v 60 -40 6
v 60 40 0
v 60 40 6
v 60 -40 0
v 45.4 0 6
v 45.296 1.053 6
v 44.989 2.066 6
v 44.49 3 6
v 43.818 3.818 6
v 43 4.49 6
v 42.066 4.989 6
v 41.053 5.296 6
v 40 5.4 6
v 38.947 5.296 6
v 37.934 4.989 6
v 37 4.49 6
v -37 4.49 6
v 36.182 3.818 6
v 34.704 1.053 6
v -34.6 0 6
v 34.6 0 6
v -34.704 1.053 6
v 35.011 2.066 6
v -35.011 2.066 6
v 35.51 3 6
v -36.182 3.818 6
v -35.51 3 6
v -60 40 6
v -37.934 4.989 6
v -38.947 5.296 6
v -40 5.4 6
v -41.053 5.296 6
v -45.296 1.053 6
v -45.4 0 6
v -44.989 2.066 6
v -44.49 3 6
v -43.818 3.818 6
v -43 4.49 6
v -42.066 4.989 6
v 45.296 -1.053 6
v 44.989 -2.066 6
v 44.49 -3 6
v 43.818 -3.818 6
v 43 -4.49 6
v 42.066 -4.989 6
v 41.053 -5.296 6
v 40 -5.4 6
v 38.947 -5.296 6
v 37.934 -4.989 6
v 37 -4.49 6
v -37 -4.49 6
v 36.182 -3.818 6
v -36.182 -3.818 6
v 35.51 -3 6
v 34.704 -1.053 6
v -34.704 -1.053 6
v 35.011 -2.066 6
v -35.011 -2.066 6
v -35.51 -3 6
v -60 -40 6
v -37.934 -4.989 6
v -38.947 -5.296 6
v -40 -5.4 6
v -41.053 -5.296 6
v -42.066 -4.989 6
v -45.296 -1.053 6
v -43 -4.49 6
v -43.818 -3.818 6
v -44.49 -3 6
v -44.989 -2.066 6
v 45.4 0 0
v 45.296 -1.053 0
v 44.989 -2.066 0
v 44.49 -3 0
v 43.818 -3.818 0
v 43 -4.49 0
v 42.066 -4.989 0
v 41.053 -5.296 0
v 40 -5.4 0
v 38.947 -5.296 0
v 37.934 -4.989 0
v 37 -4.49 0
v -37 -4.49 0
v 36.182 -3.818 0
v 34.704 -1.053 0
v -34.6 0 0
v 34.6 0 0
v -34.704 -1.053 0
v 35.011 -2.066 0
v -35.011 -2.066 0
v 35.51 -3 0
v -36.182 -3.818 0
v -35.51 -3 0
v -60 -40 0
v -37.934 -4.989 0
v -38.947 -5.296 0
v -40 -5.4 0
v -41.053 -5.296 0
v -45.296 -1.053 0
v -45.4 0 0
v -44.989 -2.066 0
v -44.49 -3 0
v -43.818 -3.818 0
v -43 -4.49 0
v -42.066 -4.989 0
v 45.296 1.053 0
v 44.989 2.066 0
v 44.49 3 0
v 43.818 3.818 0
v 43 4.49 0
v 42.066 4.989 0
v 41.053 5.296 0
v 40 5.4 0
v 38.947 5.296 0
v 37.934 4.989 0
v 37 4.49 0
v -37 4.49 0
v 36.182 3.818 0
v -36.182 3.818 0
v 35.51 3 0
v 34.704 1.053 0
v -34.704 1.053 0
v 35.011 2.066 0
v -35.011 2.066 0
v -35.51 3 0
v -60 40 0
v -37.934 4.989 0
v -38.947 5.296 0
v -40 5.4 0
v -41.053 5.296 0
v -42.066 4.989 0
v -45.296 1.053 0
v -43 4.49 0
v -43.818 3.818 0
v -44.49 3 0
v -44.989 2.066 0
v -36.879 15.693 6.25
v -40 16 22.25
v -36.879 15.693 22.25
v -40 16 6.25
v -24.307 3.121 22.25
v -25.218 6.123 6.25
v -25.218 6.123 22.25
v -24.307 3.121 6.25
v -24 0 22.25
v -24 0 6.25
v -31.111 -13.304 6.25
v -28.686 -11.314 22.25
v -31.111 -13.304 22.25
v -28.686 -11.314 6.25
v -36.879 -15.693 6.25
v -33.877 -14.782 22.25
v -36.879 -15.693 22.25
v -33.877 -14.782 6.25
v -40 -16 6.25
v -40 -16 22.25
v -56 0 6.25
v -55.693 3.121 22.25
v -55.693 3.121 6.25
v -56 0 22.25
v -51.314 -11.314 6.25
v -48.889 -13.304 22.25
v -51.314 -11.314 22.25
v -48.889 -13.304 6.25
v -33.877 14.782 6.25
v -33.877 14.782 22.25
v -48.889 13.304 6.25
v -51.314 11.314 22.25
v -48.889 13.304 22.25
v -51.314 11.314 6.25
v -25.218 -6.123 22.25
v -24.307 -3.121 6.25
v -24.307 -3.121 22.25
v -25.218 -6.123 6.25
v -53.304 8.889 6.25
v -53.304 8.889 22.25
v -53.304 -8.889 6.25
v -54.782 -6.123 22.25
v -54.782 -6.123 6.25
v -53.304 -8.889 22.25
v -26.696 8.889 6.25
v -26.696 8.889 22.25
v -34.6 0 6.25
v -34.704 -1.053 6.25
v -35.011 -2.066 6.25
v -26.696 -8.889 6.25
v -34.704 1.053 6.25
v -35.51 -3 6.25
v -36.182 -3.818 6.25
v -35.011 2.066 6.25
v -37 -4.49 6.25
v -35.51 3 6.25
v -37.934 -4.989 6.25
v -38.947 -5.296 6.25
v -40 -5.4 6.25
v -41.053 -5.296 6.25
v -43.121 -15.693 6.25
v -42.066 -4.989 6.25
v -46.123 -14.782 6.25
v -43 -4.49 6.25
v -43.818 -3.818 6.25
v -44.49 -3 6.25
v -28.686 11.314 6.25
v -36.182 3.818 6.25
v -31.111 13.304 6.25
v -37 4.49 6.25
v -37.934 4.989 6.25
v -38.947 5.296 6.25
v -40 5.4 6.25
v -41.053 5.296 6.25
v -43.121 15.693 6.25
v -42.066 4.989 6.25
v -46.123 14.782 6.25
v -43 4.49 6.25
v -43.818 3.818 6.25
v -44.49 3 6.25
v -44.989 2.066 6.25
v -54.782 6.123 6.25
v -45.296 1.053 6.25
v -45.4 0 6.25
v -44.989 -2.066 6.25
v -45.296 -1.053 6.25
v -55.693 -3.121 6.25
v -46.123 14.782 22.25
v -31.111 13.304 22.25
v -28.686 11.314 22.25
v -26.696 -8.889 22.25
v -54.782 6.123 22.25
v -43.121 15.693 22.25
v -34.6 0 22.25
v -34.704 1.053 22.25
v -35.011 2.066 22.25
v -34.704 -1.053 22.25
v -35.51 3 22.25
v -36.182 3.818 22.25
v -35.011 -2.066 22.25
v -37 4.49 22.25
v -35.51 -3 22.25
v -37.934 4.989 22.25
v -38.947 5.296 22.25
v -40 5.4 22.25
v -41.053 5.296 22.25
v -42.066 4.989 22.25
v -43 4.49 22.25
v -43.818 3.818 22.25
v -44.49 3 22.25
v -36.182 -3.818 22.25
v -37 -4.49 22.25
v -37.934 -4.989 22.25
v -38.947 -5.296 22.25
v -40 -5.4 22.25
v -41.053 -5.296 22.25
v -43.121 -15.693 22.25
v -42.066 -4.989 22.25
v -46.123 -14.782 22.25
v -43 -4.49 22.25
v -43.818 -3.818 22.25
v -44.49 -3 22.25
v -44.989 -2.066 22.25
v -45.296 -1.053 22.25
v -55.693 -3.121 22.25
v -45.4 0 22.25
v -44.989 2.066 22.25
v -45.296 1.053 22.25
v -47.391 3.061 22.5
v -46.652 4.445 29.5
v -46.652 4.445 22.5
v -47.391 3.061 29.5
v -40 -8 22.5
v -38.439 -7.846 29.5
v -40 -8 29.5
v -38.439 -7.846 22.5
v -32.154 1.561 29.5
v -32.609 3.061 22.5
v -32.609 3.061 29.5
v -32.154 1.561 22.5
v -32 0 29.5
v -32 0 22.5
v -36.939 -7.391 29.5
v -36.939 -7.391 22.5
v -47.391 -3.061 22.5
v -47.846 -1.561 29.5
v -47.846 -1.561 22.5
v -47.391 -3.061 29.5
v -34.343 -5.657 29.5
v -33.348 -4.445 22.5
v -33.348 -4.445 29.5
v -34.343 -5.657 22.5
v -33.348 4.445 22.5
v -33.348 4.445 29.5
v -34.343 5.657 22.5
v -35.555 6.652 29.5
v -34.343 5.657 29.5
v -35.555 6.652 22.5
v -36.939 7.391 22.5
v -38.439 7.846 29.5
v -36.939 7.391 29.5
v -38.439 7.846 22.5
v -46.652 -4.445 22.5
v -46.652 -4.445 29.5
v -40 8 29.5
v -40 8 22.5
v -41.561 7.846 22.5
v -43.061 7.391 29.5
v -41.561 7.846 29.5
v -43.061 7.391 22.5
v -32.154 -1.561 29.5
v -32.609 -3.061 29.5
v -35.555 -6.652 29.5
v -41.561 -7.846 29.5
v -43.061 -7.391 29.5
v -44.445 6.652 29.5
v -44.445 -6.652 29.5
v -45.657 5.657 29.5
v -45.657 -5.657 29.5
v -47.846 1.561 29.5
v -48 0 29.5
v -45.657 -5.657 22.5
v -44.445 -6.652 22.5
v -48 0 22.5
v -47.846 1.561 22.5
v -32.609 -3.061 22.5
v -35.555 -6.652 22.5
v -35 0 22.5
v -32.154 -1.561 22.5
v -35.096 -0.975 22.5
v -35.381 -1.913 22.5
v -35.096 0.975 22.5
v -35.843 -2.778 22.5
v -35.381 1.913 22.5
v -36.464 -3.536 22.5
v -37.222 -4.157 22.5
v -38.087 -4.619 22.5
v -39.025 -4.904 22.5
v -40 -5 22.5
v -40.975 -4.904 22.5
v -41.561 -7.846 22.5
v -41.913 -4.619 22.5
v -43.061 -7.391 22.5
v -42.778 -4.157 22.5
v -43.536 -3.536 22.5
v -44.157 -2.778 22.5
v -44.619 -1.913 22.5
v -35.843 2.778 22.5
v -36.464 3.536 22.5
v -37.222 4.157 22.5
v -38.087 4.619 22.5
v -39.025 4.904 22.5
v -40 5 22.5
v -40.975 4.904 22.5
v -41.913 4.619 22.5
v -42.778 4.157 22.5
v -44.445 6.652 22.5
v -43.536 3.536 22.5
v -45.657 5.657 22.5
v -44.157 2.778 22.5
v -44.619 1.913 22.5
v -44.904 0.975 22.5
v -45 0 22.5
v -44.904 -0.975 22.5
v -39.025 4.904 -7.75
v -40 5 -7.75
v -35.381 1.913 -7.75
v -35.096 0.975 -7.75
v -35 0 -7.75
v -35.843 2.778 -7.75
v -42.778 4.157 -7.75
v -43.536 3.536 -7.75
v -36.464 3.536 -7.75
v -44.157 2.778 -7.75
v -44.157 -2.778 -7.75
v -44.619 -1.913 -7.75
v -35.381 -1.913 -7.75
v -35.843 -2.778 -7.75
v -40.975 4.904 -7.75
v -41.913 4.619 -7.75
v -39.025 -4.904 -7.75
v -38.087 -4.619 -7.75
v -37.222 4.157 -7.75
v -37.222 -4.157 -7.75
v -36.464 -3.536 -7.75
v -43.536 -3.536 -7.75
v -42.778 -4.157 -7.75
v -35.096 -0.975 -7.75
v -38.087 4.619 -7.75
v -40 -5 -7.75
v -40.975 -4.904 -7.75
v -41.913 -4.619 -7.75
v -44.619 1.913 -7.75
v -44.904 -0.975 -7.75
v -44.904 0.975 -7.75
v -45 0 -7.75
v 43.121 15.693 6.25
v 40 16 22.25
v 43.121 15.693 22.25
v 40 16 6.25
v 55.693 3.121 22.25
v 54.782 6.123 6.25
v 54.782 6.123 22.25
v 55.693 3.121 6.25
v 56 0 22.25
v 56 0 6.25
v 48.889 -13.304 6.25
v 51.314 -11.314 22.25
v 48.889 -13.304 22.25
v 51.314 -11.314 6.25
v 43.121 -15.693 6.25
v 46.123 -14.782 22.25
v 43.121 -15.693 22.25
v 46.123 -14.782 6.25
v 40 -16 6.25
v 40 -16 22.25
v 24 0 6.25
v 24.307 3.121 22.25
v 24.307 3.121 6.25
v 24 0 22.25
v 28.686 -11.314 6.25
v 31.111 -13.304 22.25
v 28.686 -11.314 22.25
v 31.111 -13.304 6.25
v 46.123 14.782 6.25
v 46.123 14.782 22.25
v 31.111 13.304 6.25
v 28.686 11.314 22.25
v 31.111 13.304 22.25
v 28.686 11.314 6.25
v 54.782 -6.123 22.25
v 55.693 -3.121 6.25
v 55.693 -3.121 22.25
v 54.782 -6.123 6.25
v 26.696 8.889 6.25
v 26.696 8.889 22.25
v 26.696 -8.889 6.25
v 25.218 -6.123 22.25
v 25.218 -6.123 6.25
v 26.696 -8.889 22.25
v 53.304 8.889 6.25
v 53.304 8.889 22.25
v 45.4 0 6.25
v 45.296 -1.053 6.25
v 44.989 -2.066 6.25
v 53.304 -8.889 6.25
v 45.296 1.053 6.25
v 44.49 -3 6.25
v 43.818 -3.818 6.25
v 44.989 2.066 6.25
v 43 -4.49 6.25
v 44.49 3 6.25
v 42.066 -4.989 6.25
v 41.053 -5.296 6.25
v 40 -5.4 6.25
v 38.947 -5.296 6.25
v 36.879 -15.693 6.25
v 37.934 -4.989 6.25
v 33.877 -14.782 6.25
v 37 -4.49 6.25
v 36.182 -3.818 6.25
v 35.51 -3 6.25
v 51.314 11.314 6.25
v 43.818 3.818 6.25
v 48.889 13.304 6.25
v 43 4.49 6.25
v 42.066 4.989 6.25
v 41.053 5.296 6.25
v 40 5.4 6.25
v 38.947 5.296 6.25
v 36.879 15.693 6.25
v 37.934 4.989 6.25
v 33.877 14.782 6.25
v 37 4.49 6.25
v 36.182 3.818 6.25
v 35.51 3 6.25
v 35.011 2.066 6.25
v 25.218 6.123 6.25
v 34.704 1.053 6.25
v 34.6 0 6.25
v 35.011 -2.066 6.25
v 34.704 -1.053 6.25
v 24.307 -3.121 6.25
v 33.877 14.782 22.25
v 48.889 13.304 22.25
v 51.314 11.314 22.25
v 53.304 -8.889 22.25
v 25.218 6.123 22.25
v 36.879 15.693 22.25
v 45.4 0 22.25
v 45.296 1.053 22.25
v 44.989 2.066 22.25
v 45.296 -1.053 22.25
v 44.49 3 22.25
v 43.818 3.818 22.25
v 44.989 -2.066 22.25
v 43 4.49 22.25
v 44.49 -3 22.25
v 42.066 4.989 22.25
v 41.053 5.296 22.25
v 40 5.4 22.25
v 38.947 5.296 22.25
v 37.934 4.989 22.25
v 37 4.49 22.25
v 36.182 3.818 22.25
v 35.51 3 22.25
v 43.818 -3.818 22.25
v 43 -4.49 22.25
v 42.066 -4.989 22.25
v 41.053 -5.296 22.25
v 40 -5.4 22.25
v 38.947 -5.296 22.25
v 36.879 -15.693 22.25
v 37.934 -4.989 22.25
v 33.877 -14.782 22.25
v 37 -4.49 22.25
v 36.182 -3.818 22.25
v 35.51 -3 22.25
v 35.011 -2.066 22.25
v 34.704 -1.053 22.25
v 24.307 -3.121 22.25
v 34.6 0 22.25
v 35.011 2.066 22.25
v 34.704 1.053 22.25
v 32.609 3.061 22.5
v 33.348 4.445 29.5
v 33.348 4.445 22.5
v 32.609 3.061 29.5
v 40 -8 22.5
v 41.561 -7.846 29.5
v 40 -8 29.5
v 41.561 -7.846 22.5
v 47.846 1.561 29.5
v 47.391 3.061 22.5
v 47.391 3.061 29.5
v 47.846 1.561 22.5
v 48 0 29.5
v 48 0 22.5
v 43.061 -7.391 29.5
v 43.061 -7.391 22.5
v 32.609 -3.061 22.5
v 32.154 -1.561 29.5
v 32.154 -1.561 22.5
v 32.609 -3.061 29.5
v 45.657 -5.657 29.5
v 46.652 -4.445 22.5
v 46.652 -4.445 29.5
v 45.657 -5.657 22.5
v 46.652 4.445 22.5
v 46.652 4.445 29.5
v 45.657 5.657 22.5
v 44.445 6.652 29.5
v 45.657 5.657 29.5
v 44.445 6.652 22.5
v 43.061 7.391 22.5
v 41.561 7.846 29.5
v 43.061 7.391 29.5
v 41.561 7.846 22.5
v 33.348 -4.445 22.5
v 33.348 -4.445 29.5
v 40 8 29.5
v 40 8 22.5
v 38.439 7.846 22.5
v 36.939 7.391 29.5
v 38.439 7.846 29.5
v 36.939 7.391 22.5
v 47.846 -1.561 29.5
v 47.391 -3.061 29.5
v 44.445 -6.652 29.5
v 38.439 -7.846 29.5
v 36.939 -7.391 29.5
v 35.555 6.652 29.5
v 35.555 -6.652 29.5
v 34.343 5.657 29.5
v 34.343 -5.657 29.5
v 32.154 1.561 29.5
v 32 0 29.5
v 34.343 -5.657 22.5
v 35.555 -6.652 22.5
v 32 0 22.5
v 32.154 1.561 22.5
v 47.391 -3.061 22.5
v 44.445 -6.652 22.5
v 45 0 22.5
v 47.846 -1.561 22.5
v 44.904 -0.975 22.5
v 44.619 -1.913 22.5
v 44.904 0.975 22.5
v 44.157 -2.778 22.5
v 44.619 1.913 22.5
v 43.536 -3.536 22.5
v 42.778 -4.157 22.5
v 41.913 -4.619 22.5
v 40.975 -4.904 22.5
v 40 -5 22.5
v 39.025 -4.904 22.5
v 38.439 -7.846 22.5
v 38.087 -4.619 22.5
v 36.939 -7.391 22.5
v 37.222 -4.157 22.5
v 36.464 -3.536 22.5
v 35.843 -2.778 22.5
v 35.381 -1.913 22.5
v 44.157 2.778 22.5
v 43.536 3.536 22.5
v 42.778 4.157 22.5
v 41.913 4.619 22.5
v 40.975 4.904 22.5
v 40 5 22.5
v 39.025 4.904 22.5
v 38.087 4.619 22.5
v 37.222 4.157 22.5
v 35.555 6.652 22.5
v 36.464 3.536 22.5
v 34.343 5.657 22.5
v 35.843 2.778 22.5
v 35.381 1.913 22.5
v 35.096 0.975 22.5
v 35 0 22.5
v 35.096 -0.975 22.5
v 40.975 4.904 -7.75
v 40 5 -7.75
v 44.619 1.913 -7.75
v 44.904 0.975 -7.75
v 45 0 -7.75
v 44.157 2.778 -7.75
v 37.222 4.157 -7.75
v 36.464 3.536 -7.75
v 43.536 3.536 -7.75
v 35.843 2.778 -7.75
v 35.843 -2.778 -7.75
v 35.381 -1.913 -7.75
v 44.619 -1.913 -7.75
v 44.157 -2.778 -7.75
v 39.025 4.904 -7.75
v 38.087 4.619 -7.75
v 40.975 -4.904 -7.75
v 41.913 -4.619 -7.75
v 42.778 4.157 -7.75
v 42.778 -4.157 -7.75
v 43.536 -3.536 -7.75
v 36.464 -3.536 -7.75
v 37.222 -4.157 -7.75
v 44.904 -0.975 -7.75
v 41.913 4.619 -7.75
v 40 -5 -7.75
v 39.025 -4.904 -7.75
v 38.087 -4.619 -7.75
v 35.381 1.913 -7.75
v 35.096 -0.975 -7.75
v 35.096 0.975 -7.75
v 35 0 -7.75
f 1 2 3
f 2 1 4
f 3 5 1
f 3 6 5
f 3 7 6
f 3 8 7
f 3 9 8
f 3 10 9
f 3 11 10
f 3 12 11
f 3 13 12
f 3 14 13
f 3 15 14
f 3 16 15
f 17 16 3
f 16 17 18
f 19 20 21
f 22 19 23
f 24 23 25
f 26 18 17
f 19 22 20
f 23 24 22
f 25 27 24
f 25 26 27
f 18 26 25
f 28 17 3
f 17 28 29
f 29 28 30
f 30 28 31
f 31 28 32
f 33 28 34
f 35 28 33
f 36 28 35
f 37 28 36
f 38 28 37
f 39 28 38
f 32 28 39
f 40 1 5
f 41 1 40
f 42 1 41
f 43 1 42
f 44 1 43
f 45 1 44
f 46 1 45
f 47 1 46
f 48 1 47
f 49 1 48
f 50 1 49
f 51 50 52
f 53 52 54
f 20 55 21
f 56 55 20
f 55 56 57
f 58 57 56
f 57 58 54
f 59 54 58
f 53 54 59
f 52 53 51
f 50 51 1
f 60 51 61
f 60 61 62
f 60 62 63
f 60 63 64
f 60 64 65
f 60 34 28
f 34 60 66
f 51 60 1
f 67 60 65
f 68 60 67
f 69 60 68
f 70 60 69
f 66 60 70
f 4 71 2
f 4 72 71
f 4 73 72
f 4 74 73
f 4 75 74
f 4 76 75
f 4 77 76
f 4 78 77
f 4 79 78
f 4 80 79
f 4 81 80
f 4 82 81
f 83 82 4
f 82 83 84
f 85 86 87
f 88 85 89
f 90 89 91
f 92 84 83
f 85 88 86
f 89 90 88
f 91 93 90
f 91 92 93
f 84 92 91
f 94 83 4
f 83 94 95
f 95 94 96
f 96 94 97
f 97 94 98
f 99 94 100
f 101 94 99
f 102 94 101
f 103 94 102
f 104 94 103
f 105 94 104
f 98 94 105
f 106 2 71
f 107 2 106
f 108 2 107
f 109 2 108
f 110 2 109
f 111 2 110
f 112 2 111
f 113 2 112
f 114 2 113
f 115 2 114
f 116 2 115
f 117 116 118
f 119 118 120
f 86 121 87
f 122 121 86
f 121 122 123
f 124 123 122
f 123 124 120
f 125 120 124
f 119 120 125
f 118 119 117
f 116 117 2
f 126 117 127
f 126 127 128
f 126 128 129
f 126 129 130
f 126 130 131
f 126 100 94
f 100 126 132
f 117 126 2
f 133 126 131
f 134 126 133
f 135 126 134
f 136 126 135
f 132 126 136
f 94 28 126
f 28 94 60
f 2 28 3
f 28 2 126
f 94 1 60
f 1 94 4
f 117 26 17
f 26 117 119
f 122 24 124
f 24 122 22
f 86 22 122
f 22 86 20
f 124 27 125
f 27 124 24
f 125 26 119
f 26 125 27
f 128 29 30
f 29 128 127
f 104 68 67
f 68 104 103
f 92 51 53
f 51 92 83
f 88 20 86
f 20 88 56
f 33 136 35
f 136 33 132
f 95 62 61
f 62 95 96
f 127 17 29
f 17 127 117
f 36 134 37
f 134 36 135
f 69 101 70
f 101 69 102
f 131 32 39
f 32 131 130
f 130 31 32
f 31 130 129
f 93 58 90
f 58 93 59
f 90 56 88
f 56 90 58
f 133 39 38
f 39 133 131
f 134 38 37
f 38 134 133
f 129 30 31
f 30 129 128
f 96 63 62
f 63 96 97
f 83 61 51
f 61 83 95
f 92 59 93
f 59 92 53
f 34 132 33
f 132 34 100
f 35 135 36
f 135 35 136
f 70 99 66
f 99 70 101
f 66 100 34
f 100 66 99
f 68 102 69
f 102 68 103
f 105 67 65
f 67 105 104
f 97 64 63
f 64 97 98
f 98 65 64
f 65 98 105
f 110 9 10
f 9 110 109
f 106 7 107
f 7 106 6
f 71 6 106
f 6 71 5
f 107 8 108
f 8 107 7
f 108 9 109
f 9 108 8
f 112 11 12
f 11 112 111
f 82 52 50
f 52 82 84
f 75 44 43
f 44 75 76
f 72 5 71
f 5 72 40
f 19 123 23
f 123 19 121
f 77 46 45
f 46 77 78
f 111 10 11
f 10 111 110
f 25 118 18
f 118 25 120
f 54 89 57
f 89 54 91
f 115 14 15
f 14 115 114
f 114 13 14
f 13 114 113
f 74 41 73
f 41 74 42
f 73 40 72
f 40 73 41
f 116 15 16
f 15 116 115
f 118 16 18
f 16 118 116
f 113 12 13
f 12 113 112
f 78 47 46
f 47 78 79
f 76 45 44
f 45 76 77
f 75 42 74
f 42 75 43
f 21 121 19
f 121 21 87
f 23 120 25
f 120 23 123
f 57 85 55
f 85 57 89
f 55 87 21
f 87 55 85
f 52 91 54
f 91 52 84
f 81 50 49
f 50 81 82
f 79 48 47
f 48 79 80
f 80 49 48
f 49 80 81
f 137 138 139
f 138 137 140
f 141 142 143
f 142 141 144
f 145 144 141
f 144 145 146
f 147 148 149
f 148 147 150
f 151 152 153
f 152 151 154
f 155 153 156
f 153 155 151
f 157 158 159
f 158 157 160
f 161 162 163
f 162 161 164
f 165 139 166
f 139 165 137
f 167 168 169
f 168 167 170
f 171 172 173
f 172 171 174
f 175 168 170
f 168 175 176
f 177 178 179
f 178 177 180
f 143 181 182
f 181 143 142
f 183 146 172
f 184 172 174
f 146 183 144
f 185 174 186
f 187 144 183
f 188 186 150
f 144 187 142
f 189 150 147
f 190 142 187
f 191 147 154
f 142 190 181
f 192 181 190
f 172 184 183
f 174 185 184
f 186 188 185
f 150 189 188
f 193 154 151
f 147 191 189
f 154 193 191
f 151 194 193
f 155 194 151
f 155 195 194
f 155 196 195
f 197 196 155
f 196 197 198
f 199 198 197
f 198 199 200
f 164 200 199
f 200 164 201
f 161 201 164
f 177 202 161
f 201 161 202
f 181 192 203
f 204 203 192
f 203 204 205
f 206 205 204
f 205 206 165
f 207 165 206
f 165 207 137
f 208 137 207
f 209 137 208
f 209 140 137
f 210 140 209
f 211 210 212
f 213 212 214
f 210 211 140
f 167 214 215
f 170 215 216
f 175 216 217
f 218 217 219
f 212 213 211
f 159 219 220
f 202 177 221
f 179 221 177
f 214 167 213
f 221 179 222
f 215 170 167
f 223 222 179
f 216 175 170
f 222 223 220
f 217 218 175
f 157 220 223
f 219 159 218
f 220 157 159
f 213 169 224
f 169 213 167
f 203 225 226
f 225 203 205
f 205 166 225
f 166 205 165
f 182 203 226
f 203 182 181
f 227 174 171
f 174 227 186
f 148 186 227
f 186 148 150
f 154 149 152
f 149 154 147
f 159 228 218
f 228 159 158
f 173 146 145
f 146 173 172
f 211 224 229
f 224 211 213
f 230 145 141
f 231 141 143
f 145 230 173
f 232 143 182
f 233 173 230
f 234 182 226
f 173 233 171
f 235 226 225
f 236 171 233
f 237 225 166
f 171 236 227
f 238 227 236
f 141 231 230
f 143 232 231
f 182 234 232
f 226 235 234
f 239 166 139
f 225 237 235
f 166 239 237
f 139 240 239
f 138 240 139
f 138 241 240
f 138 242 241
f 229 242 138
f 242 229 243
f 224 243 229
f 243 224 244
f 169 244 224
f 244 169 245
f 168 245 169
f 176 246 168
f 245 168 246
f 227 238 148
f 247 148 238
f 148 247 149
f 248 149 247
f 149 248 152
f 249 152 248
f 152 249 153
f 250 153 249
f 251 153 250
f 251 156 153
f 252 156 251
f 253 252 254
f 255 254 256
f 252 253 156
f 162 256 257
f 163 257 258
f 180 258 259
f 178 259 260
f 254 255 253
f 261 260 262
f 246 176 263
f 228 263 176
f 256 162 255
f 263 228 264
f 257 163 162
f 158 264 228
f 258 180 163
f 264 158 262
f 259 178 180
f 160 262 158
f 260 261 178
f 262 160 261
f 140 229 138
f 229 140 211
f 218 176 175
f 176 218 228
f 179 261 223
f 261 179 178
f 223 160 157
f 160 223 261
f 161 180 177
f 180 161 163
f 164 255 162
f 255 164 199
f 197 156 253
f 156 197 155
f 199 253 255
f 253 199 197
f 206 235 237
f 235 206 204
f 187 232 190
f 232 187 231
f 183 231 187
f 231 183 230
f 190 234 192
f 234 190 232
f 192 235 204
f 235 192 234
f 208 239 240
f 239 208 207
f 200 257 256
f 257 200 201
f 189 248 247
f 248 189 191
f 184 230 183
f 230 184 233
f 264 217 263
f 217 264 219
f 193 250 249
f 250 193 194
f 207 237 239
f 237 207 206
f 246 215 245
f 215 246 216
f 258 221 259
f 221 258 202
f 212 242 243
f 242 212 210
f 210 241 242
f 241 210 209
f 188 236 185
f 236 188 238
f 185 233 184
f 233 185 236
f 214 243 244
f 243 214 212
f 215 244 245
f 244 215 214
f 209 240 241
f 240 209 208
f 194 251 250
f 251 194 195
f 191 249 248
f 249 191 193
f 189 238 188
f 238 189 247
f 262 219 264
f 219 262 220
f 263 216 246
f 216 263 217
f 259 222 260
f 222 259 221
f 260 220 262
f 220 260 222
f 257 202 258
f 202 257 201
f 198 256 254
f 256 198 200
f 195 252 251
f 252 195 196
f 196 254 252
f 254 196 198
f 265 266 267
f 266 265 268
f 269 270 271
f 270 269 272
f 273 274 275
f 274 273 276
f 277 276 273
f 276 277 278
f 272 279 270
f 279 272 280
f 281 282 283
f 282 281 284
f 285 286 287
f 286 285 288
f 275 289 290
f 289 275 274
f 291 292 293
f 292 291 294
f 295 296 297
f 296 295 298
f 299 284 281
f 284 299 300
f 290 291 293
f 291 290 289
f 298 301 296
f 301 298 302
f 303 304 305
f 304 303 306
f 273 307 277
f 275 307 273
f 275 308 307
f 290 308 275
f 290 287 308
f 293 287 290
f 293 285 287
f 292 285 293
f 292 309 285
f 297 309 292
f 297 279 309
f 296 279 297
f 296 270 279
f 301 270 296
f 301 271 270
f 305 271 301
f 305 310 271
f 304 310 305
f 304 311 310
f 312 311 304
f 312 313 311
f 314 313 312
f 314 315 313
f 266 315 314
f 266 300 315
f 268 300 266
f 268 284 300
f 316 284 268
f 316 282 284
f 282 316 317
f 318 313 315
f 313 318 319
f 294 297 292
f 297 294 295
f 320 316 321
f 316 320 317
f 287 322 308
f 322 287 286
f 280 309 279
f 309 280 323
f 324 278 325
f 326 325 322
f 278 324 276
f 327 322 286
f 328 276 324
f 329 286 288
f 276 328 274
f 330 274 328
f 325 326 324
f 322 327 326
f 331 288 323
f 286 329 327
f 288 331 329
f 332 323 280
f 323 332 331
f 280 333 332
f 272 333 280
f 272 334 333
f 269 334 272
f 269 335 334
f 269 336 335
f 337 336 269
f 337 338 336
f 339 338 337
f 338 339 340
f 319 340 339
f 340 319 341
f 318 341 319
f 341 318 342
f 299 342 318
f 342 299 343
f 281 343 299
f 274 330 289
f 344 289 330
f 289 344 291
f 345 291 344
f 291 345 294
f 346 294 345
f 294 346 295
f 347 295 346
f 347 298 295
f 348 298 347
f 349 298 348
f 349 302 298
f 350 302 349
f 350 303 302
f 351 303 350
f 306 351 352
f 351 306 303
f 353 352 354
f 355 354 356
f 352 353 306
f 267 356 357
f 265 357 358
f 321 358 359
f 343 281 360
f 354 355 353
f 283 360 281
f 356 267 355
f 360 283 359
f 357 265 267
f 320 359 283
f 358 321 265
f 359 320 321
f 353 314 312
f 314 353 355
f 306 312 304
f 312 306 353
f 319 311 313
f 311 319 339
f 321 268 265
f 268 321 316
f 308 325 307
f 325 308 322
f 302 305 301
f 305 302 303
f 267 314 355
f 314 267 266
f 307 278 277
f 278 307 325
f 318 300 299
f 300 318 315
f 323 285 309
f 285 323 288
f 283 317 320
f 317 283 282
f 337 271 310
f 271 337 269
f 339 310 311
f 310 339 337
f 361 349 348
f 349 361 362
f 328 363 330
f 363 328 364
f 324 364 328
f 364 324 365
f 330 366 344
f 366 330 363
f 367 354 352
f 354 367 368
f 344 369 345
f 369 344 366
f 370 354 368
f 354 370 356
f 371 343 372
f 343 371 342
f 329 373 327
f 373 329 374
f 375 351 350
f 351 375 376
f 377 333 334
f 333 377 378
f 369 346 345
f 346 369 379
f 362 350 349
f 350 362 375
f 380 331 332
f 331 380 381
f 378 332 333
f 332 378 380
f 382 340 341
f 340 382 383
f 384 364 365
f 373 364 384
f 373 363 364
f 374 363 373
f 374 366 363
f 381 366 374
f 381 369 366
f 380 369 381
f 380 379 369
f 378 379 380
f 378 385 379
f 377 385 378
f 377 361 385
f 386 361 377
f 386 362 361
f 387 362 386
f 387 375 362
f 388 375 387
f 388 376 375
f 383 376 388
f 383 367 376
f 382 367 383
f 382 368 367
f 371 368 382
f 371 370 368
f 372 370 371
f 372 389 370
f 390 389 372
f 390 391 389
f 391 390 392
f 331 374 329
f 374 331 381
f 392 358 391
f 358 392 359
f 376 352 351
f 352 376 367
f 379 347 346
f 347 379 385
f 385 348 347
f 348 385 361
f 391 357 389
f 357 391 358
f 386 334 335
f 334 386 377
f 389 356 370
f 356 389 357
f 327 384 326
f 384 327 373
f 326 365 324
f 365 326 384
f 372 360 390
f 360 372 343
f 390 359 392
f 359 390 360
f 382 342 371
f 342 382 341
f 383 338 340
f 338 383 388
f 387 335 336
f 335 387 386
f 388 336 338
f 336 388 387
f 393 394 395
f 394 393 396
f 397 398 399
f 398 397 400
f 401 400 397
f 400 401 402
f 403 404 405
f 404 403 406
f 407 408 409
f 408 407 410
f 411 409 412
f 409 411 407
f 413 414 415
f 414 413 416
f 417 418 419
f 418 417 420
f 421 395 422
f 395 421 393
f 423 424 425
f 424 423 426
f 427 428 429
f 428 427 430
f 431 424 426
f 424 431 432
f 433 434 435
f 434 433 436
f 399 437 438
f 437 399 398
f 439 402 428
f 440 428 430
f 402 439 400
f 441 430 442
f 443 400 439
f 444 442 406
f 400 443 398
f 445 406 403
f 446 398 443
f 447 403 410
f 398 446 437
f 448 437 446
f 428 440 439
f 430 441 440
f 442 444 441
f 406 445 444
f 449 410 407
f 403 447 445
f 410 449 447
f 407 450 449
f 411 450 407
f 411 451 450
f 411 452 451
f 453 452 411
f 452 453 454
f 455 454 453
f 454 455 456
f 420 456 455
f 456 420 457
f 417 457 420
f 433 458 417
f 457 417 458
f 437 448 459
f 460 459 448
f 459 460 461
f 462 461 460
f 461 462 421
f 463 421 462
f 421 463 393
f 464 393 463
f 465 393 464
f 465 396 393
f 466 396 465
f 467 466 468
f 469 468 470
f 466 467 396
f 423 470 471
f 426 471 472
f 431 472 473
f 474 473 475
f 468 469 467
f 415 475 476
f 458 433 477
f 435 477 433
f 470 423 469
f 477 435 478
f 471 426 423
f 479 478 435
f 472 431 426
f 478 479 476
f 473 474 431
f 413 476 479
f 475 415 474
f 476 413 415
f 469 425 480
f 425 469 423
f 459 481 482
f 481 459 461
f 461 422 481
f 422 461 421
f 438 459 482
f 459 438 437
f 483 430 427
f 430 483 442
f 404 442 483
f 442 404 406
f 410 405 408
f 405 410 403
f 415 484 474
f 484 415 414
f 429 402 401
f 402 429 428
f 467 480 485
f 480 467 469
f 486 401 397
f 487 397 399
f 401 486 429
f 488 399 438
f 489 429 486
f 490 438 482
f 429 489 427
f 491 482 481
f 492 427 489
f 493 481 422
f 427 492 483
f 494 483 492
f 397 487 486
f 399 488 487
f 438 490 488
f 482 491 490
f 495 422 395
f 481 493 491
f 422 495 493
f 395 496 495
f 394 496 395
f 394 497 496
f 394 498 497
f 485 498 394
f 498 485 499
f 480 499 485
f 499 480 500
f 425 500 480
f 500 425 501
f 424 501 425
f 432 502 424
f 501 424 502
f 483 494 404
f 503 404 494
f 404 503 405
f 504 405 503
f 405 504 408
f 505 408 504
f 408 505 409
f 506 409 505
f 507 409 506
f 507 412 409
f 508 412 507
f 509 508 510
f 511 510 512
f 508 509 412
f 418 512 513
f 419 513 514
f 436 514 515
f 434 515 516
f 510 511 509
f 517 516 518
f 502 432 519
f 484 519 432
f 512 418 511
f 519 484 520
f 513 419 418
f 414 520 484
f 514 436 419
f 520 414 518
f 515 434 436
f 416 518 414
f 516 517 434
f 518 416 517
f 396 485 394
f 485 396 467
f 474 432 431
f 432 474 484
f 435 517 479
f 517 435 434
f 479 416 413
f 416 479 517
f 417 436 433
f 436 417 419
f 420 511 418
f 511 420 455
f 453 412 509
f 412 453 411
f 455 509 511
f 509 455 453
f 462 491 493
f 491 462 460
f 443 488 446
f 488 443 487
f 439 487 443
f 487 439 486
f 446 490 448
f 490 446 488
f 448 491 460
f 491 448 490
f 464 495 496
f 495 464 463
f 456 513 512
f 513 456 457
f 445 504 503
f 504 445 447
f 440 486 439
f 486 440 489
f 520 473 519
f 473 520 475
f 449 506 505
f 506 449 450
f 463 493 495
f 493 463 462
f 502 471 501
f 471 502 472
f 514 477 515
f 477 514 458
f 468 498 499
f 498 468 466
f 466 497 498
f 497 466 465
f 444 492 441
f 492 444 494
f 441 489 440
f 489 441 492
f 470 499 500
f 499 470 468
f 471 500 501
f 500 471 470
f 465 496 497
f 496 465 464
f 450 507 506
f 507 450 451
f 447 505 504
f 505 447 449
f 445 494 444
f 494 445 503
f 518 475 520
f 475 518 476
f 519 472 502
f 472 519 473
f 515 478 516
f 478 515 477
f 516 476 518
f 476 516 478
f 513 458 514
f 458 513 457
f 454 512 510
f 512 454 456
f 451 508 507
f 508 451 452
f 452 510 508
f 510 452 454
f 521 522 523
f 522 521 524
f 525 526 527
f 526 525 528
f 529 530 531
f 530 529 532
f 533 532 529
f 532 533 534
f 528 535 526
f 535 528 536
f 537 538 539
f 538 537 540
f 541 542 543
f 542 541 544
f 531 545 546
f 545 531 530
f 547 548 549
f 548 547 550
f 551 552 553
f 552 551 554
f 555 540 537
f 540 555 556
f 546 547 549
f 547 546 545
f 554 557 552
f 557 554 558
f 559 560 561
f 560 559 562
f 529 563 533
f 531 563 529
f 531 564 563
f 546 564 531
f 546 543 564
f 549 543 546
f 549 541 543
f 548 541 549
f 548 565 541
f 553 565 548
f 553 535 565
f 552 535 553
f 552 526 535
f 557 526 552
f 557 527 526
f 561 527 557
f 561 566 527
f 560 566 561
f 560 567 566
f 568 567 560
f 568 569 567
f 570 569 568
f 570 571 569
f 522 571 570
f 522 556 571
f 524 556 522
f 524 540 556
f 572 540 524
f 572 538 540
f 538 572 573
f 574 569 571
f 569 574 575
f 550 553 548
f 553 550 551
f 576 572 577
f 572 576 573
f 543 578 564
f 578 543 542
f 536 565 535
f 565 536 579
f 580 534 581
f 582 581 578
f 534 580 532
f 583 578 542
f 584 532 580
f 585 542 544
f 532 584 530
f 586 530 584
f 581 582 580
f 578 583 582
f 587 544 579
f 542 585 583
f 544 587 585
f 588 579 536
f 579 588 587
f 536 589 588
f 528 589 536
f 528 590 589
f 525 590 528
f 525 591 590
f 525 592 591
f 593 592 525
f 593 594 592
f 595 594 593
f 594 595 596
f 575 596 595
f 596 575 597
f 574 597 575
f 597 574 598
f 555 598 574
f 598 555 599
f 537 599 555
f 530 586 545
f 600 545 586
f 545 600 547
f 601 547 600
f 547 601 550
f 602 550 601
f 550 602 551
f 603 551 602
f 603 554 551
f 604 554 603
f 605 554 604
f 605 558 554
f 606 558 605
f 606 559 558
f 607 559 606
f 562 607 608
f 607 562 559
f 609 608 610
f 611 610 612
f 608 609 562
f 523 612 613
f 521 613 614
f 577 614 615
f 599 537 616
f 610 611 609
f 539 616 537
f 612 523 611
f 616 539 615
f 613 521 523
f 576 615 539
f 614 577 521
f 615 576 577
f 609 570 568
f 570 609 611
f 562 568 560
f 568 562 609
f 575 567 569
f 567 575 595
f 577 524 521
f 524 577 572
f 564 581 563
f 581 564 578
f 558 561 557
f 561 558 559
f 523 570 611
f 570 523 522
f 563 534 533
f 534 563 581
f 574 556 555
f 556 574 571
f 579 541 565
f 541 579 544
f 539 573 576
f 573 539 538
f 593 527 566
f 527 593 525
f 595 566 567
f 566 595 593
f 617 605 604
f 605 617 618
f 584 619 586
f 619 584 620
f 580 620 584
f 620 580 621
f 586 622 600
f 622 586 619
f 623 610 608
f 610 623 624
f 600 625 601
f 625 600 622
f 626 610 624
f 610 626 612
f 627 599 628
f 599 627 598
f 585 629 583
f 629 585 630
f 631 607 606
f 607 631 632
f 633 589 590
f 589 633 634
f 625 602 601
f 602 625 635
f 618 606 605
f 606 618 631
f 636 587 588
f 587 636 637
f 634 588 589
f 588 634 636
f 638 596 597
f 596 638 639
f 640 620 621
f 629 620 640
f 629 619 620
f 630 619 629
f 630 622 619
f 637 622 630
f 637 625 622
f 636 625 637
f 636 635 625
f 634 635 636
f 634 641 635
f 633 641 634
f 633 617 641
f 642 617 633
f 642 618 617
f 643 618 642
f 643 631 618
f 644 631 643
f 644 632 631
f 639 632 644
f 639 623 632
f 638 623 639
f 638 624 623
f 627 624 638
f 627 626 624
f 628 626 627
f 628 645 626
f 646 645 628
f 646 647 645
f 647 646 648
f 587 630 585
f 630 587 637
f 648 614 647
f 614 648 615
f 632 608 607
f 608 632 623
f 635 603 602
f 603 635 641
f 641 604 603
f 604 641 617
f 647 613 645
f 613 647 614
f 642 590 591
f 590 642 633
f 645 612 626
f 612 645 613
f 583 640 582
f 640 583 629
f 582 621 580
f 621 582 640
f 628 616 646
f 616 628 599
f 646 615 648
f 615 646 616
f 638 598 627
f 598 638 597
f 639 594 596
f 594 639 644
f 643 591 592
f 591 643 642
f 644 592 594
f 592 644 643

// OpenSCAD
$fn = 32;

// ------------------------------------------------------------------------
// Standoff columns: 2 d32 standoffs, bolts d10
// Every part is its own module, assembly() places them once.
// ------------------------------------------------------------------------

// --- part 1 ---
module base_plate() {
  difference() {
    translate([-60, -40, 0]) cube([120, 80, 6]);
    translate([-40, 0, -1]) cylinder(h = 8, d = 10.8);
    translate([40, 0, -1]) cylinder(h = 8, d = 10.8);
  }
}

// --- part 2 ---
module spacer1() {
  difference() {
      translate([0, 0, 0]) cylinder(h = 16, d = 32);
      translate([0, 0, -1]) cylinder(h = 18, d = 10.8);
    }
}

// --- part 3 ---
module bolt1() {
  cylinder(h = 7, d = 16);
  translate([0, 0, -30.25]) cylinder(h = 30.25, d = 10);
}

// --- part 4 ---
module spacer2() {
  difference() {
      translate([0, 0, 0]) cylinder(h = 16, d = 32);
      translate([0, 0, -1]) cylinder(h = 18, d = 10.8);
    }
}

// --- part 5 ---
module bolt2() {
  cylinder(h = 7, d = 16);
  translate([0, 0, -30.25]) cylinder(h = 30.25, d = 10);
}

// --- assembly ---
module assembly() {
  translate([0, 0, 0]) rotate([0, 0, 0]) base_plate();
  translate([-40, 0, 6.25]) rotate([0, 0, 0]) spacer1();
  translate([-40, 0, 22.5]) rotate([0, 0, 0]) bolt1();
  translate([40, 0, 6.25]) rotate([0, 0, 0]) spacer2();
  translate([40, 0, 22.5]) rotate([0, 0, 0]) bolt2();
}

assembly();
